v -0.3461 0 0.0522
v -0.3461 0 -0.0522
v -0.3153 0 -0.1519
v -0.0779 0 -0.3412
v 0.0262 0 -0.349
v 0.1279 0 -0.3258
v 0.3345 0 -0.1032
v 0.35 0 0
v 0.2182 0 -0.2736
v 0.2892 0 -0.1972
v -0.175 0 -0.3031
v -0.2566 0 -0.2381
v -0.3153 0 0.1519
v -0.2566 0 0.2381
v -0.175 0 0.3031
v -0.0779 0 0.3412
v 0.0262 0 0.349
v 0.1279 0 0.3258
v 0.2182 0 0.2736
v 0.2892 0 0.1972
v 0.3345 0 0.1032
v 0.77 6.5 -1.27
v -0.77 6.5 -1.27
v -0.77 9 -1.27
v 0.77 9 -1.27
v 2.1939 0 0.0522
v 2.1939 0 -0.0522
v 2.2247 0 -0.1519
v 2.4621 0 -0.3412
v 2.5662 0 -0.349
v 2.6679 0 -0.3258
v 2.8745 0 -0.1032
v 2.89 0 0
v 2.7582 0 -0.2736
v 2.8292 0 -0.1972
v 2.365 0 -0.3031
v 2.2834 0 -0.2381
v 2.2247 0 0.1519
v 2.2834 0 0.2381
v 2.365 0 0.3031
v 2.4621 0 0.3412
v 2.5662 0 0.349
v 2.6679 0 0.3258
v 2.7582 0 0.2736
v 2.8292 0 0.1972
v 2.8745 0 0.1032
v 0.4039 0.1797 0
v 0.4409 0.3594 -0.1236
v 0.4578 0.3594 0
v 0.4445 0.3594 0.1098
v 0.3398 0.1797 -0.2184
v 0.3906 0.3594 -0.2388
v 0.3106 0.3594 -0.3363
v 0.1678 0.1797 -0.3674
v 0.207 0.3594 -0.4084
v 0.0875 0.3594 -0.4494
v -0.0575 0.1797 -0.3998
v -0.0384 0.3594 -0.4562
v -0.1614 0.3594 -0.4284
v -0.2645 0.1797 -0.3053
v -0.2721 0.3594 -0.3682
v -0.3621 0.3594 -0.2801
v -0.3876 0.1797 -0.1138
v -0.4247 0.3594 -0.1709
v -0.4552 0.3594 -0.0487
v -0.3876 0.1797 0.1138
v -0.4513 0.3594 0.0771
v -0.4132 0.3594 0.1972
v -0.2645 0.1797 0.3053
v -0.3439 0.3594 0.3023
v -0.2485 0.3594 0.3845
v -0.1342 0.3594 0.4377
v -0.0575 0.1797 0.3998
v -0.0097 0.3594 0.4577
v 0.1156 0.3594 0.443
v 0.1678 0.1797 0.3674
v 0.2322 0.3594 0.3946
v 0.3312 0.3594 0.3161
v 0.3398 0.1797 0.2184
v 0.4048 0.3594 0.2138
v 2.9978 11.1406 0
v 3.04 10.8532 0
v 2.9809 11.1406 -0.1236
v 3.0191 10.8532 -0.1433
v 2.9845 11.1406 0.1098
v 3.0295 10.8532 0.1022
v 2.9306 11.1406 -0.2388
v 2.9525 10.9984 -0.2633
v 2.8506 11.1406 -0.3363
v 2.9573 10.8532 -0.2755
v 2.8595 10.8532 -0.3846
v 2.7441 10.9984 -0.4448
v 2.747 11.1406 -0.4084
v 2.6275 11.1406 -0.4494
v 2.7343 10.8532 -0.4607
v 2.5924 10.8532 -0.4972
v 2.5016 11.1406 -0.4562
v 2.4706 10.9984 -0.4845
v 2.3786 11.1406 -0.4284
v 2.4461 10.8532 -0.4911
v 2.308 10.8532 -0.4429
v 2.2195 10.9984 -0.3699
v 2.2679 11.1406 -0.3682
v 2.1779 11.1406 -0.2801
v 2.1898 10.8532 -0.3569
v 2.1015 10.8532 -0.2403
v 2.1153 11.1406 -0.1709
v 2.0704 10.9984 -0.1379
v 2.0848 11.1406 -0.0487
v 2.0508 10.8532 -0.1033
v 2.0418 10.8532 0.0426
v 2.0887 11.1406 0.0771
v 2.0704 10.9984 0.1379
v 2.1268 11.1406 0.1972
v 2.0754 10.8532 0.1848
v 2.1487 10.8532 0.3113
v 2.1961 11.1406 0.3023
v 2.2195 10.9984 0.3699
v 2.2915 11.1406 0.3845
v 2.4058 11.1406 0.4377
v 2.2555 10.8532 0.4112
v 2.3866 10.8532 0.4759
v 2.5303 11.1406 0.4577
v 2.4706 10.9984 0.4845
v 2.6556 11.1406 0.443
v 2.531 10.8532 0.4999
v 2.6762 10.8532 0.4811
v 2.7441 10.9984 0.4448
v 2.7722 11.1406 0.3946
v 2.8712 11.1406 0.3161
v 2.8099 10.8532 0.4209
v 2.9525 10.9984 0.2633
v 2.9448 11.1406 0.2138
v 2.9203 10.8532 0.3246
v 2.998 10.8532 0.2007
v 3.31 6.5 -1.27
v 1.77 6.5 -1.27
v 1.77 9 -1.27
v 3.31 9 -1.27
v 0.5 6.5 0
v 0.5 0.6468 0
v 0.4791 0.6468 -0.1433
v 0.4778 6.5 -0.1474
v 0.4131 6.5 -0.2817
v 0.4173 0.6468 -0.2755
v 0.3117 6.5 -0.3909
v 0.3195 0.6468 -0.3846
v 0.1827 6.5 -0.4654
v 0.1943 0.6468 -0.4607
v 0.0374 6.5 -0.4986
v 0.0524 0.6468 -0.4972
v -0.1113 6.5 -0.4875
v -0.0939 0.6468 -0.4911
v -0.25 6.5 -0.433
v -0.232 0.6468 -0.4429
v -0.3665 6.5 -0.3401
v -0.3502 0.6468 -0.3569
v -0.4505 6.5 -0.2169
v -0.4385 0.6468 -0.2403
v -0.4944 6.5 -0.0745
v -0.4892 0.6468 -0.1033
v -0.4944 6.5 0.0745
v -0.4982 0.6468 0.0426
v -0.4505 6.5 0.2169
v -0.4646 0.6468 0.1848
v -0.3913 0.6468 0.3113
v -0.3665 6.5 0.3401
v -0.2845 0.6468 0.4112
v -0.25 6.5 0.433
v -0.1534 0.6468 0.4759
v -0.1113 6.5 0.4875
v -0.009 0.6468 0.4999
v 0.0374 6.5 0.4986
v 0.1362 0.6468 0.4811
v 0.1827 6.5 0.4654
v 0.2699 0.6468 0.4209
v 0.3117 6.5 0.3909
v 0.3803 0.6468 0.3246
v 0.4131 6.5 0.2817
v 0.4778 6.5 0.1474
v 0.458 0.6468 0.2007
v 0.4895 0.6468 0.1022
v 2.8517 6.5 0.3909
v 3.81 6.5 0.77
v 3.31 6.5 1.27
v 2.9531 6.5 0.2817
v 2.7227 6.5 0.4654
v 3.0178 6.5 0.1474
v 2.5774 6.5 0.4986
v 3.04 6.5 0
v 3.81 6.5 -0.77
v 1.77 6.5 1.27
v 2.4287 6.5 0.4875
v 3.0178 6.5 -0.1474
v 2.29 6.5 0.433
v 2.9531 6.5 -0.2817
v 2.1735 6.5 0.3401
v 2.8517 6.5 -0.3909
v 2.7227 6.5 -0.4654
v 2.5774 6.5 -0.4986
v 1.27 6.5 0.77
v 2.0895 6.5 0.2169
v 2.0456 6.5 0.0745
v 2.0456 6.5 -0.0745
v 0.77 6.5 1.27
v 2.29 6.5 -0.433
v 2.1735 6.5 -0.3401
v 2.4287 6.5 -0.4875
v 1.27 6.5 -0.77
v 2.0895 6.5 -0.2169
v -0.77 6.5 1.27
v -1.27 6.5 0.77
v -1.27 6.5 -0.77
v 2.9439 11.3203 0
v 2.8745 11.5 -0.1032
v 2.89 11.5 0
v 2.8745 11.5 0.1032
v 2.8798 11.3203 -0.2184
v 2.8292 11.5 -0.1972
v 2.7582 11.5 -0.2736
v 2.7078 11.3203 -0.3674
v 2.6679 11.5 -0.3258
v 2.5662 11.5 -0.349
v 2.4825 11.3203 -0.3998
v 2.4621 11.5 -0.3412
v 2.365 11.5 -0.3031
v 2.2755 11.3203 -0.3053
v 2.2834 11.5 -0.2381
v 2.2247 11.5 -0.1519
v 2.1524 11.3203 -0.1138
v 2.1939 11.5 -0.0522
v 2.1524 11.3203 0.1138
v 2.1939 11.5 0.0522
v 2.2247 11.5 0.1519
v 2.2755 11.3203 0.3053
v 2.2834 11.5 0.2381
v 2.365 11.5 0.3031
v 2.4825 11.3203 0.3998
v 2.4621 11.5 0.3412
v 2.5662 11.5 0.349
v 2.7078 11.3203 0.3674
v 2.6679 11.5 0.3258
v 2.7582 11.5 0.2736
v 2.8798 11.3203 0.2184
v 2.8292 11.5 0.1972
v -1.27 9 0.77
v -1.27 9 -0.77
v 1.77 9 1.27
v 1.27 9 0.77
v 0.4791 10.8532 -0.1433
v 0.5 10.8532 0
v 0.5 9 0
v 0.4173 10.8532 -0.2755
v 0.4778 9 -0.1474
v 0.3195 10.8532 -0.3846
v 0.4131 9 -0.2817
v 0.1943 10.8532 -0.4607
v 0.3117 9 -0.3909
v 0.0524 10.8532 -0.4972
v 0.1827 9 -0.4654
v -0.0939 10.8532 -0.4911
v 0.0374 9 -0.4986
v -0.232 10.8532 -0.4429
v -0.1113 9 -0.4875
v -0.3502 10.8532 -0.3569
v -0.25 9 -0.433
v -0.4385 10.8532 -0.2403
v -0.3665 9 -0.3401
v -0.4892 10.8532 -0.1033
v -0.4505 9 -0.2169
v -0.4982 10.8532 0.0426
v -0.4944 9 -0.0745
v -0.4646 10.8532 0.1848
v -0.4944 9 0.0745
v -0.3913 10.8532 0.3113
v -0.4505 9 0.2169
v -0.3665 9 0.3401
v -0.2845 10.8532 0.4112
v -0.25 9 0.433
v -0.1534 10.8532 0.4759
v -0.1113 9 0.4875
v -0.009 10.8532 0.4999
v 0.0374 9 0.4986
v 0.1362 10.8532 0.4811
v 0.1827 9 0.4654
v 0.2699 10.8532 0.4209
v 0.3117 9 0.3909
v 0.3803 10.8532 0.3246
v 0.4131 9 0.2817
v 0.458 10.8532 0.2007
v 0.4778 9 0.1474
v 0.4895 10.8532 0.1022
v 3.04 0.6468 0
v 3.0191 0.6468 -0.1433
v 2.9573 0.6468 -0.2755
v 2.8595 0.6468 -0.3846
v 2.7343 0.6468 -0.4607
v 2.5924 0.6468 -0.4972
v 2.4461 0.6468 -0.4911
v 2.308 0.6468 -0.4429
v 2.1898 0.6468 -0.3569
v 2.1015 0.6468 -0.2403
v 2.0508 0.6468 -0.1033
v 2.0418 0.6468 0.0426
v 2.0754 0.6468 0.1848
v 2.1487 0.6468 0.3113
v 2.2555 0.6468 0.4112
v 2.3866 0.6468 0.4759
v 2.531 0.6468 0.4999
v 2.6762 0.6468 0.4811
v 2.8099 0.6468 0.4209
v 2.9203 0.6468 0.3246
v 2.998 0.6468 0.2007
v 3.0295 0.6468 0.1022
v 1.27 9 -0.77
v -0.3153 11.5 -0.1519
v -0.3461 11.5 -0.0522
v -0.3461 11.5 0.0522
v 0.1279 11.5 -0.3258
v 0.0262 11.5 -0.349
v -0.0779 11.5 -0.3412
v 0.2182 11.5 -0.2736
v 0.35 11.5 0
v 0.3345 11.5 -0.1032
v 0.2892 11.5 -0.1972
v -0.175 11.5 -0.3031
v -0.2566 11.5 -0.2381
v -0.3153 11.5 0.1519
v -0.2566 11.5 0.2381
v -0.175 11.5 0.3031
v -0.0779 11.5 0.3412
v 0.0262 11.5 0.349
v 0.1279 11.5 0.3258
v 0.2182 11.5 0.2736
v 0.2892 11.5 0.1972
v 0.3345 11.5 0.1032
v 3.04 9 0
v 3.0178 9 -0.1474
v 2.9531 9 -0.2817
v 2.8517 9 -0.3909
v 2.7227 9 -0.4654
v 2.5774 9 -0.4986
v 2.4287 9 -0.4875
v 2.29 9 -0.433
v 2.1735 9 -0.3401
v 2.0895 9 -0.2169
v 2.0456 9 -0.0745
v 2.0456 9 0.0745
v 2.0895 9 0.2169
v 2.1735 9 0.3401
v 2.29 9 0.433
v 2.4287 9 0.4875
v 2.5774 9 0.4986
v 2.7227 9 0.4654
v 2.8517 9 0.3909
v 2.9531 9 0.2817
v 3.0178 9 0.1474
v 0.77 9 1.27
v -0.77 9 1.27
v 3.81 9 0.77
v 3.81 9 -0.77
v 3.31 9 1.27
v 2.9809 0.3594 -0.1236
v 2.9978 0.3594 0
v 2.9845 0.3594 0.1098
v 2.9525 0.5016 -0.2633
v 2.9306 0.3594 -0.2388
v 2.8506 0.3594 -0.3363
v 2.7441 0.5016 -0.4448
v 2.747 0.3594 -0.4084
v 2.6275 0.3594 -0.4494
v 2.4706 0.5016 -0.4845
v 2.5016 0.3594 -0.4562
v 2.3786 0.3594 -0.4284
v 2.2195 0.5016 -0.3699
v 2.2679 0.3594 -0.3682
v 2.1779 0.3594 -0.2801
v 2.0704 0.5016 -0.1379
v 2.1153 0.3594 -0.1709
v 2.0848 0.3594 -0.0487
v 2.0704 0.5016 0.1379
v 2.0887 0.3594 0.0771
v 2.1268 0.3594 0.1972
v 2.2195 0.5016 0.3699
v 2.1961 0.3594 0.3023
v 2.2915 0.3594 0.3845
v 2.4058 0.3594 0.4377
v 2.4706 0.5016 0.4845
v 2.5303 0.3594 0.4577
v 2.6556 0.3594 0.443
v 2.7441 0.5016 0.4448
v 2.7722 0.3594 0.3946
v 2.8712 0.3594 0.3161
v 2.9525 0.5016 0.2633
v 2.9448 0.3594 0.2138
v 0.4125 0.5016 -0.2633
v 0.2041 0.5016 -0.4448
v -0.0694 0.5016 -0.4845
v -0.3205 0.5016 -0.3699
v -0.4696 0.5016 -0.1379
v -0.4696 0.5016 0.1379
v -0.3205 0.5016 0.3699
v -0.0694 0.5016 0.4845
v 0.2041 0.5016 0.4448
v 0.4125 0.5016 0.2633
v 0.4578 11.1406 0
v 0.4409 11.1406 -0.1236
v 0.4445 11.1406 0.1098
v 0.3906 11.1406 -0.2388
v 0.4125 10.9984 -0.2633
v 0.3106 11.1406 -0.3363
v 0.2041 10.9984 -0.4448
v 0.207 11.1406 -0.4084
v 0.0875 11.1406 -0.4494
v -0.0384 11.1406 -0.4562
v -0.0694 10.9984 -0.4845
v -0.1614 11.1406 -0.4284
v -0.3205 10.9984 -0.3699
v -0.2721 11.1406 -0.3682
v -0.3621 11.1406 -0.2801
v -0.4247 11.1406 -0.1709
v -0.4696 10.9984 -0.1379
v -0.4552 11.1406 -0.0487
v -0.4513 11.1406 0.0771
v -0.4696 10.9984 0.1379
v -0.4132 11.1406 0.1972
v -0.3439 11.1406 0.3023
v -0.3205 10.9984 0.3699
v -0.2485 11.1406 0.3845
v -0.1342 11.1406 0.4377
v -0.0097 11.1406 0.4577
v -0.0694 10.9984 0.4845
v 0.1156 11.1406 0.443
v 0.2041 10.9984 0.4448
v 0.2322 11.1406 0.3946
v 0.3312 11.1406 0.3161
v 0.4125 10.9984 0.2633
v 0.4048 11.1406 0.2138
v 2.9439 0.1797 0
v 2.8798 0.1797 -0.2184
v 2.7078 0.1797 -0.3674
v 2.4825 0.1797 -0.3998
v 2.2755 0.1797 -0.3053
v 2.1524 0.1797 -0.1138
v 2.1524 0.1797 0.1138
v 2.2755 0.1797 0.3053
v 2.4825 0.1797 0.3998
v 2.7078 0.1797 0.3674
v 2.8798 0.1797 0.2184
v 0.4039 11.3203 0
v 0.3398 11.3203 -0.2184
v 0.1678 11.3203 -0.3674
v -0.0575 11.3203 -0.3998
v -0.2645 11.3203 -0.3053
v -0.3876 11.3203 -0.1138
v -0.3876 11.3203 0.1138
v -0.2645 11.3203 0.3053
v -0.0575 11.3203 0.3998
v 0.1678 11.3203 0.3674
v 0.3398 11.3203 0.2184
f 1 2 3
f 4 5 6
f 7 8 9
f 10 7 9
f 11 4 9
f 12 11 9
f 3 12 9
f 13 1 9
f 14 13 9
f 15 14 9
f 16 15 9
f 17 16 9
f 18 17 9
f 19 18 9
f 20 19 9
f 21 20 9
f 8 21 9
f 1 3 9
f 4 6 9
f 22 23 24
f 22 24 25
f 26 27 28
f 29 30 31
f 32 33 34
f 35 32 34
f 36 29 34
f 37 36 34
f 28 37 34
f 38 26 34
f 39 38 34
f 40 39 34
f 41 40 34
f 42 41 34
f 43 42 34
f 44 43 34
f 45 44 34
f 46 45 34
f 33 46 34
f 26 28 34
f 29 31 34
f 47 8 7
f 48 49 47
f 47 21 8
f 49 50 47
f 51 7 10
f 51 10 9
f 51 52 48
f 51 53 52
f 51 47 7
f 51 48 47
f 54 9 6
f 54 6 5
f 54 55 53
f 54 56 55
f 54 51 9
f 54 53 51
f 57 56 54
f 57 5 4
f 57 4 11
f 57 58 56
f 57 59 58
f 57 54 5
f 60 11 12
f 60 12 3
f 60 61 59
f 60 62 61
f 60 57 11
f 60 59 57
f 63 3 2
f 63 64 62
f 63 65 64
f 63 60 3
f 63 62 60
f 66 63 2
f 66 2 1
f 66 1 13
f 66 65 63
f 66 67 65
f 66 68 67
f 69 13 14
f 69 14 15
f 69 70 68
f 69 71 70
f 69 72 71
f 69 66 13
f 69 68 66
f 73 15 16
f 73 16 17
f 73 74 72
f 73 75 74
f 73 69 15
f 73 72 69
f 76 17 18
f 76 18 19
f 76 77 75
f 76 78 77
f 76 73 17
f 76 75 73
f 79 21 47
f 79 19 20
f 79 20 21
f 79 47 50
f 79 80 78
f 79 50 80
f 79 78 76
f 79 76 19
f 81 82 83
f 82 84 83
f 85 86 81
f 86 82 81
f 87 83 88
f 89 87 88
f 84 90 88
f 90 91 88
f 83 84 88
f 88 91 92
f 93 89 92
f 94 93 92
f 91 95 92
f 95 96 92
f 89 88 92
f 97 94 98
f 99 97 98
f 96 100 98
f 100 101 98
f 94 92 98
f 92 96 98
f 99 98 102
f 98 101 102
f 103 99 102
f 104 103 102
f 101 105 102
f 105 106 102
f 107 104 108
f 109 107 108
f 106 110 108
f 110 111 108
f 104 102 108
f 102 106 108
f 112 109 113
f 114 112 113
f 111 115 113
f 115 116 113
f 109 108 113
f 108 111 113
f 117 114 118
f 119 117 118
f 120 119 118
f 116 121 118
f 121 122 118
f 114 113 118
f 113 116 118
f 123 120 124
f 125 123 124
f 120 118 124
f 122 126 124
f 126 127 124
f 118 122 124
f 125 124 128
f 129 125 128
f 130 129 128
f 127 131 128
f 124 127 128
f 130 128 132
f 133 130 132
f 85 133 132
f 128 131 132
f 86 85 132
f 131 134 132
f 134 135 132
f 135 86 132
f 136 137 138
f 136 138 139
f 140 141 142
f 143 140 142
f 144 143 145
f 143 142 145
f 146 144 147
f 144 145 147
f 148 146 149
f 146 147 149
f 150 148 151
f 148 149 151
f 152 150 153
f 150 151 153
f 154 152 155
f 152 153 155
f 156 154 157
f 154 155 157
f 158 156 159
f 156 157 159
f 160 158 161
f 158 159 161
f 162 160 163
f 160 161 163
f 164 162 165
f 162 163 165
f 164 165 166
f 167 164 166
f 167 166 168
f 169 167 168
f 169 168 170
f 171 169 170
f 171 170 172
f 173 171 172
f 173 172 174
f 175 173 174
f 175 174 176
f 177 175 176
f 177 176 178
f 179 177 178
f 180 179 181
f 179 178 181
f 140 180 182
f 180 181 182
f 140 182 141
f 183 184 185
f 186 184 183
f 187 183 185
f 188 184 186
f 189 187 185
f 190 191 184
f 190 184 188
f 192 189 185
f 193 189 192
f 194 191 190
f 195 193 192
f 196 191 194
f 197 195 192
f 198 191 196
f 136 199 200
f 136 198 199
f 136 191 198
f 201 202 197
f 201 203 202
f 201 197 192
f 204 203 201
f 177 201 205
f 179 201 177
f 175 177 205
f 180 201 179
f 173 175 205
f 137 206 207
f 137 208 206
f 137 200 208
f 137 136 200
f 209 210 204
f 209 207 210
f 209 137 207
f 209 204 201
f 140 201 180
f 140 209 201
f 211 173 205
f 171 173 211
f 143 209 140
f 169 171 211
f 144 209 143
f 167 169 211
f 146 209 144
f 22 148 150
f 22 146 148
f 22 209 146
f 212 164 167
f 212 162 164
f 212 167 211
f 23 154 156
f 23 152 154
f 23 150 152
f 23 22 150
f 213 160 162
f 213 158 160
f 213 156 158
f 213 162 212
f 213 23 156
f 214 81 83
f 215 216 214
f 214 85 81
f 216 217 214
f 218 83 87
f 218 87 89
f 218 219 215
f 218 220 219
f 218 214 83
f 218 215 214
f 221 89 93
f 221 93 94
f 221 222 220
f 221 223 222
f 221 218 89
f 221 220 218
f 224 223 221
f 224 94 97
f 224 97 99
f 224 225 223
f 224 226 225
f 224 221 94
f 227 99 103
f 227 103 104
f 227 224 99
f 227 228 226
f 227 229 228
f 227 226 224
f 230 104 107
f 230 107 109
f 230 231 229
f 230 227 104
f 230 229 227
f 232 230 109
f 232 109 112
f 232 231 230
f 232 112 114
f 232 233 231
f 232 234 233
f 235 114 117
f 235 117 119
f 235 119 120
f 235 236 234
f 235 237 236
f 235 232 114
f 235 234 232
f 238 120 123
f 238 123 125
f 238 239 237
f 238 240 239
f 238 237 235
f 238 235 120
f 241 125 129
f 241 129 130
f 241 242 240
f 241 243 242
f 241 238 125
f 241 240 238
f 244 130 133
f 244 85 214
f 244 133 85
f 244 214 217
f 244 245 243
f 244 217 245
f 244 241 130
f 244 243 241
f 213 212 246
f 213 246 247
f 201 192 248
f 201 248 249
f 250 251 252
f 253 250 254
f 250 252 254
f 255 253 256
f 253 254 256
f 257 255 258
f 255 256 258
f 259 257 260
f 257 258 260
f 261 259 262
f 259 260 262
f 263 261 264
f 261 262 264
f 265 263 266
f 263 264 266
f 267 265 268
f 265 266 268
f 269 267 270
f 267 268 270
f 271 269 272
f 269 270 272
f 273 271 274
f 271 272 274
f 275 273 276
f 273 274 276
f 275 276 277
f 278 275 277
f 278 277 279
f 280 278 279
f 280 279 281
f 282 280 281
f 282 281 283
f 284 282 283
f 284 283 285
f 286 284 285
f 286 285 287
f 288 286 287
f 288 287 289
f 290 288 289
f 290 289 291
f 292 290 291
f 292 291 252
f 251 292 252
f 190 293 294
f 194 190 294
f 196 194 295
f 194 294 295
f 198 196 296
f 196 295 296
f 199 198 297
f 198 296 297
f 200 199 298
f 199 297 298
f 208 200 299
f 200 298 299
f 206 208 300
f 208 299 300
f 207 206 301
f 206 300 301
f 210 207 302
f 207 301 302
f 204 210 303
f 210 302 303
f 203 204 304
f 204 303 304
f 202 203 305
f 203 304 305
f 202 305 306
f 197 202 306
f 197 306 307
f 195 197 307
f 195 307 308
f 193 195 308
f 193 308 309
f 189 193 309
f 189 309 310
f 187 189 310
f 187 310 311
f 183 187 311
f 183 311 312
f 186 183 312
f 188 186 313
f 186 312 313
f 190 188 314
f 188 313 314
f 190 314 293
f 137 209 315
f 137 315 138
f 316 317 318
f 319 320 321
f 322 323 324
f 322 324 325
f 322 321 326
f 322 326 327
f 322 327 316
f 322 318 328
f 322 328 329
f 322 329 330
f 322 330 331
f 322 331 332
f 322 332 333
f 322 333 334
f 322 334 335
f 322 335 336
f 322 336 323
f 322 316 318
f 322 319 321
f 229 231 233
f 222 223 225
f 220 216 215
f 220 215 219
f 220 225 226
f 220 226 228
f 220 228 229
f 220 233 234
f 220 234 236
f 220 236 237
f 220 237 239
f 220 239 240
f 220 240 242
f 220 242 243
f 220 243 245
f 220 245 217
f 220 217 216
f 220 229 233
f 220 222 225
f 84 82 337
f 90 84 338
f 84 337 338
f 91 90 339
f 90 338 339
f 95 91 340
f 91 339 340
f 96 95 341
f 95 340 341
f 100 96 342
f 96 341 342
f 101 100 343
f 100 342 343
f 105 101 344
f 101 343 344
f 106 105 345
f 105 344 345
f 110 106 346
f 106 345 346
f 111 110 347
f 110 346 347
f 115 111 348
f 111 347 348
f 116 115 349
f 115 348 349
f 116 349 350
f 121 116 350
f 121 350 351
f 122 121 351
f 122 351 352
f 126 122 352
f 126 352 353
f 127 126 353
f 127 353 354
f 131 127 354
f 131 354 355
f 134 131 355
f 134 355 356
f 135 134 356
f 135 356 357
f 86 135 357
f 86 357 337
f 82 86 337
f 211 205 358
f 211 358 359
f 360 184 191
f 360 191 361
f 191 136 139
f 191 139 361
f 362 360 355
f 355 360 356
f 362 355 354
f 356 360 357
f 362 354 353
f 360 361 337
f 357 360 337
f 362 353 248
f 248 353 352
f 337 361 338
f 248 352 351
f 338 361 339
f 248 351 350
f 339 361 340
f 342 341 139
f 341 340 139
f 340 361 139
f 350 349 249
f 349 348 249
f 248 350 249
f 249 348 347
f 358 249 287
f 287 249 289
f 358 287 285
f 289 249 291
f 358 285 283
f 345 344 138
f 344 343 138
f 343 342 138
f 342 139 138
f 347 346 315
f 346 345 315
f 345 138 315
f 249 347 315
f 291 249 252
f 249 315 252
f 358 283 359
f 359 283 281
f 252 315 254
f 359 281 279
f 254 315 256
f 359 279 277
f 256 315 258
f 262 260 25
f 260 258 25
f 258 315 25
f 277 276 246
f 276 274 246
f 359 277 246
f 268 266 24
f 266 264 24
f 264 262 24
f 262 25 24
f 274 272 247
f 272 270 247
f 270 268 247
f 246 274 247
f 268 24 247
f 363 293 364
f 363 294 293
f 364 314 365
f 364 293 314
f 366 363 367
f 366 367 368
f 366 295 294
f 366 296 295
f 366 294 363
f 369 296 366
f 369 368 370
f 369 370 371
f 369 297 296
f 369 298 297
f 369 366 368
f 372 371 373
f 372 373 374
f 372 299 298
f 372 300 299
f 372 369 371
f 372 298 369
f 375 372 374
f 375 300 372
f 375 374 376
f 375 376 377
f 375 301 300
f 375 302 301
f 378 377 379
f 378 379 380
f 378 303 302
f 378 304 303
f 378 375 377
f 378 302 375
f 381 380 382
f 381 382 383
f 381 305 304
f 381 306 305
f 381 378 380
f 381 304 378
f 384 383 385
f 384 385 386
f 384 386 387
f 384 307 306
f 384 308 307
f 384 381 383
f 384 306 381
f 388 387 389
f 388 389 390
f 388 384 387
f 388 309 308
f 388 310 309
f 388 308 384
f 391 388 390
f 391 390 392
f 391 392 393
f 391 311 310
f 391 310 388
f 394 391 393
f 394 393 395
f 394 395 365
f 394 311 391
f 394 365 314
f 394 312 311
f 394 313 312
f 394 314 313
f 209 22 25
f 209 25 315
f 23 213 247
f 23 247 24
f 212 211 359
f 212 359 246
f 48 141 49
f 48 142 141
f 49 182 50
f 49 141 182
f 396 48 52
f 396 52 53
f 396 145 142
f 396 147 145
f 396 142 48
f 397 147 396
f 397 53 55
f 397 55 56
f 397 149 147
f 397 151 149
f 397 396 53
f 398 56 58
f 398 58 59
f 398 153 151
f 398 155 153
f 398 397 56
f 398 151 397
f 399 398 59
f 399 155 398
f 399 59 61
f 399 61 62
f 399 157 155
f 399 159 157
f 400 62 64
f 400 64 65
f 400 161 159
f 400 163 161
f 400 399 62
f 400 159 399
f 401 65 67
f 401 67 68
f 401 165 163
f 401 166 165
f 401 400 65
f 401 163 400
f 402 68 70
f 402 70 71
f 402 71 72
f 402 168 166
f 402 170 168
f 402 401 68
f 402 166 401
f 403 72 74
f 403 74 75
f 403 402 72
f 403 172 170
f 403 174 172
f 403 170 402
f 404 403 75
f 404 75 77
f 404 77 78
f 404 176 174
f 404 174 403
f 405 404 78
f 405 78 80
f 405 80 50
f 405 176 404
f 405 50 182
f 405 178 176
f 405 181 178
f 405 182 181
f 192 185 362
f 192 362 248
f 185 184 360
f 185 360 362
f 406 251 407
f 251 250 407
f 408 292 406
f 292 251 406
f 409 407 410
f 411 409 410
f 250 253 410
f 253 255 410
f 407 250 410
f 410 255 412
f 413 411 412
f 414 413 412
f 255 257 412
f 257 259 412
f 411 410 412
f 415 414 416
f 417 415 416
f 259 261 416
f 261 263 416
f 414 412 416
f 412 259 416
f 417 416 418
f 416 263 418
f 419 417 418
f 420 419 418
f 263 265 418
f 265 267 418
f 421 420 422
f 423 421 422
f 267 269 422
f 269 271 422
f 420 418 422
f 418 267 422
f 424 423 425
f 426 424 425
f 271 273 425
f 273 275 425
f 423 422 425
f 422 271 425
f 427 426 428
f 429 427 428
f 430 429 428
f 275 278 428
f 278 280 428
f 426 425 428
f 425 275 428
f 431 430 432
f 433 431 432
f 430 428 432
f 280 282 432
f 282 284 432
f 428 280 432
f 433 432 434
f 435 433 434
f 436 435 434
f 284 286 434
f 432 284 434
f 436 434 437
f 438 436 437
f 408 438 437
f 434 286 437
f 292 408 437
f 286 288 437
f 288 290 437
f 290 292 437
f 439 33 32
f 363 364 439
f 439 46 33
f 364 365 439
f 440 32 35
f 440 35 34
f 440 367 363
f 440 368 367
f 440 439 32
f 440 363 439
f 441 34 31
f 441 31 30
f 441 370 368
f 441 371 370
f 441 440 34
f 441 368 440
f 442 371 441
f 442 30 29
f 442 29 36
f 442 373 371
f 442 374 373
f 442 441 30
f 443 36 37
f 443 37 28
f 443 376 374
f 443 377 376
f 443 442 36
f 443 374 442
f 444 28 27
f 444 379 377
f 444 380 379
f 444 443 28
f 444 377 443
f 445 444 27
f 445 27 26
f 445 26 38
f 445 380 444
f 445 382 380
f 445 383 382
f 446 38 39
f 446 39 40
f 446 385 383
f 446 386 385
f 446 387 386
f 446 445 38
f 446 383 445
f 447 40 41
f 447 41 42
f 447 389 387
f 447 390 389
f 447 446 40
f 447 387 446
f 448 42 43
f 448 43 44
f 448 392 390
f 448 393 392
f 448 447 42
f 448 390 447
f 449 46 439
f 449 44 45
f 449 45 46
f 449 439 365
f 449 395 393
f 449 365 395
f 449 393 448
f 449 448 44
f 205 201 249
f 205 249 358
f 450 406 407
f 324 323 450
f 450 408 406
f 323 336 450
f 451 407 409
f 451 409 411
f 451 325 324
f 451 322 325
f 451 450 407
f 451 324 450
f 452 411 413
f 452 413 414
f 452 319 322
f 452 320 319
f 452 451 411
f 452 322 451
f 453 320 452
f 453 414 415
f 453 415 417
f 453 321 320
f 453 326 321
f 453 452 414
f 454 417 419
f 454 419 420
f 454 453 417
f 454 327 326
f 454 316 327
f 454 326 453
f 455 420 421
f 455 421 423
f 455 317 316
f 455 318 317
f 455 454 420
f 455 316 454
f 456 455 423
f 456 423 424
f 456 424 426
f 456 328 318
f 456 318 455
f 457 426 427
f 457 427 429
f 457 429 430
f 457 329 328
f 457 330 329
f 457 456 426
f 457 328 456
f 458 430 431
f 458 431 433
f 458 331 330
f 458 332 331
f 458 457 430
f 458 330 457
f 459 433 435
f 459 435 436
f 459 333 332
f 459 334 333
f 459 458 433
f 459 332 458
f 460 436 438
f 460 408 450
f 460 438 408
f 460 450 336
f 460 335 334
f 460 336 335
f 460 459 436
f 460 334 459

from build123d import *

# Parameters (mm, degrees)
SKETCH1_R               = 0.5
BOSS_EXTRUDE1_DEPTH     = 11.5
BOSS_EXTRUDE1_2_DEPTH   = 11.5
BOSS_EXTRUDE1_3_DEPTH   = 11.5
BOSS_EXTRUDE1_4_DEPTH   = 11.5
BOSS_EXTRUDE1_5_DEPTH   = 11.5
BOSS_EXTRUDE1_6_DEPTH   = 11.5
BOSS_EXTRUDE1_7_DEPTH   = 11.5
BOSS_EXTRUDE1_8_DEPTH   = 11.5
BOSS_EXTRUDE1_9_DEPTH   = 11.5
BOSS_EXTRUDE1_10_DEPTH  = 11.5
BOSS_EXTRUDE1_11_DEPTH  = 11.5
BOSS_EXTRUDE1_12_DEPTH  = 11.5
BOSS_EXTRUDE1_13_DEPTH  = 11.5
BOSS_EXTRUDE1_14_DEPTH  = 11.5
BOSS_EXTRUDE1_15_DEPTH  = 11.5
BOSS_EXTRUDE1_16_DEPTH  = 11.5
BOSS_EXTRUDE2_DEPTH     = 2.5
CHAMFER1_SIZE           = 0.5
CHAMFER1_SIZE2          = 0.15
CHAMFER1_PART_2_SIZE    = 0.5
CHAMFER1_PART_2_SIZE2   = 0.15
CHAMFER1_PART_3_SIZE    = 0.5
CHAMFER1_PART_3_SIZE2   = 0.15
CHAMFER1_PART_4_SIZE    = 0.5
CHAMFER1_PART_4_SIZE2   = 0.15
CHAMFER1_PART_5_SIZE    = 0.5
CHAMFER1_PART_5_SIZE2   = 0.15
CHAMFER1_PART_6_SIZE    = 0.5
CHAMFER1_PART_6_SIZE2   = 0.15
CHAMFER1_PART_7_SIZE    = 0.5
CHAMFER1_PART_7_SIZE2   = 0.15
CHAMFER1_PART_8_SIZE    = 0.5
CHAMFER1_PART_8_SIZE2   = 0.15
CHAMFER1_PART_9_SIZE    = 0.5
CHAMFER1_PART_9_SIZE2   = 0.15
CHAMFER1_PART_10_SIZE   = 0.5
CHAMFER1_PART_10_SIZE2  = 0.15
CHAMFER1_PART_11_SIZE   = 0.5
CHAMFER1_PART_11_SIZE2  = 0.15
CHAMFER1_PART_12_SIZE   = 0.5
CHAMFER1_PART_12_SIZE2  = 0.15
CHAMFER1_PART_13_SIZE   = 0.5
CHAMFER1_PART_13_SIZE2  = 0.15
CHAMFER1_PART_14_SIZE   = 0.5
CHAMFER1_PART_14_SIZE2  = 0.15
CHAMFER1_PART_15_SIZE   = 0.5
CHAMFER1_PART_15_SIZE2  = 0.15
CHAMFER1_PART_16_SIZE   = 0.5
CHAMFER1_PART_16_SIZE2  = 0.15
FILLET1_R               = 1
CHAMFER2_SIZE           = 0.15
CHAMFER2_SIZE2          = 0.5
CHAMFER2_PART_2_SIZE    = 0.15
CHAMFER2_PART_2_SIZE2   = 0.5
CHAMFER2_PART_3_SIZE    = 0.15
CHAMFER2_PART_3_SIZE2   = 0.5
CHAMFER2_PART_4_SIZE    = 0.15
CHAMFER2_PART_4_SIZE2   = 0.5
CHAMFER2_PART_5_SIZE    = 0.15
CHAMFER2_PART_5_SIZE2   = 0.5
CHAMFER2_PART_6_SIZE    = 0.15
CHAMFER2_PART_6_SIZE2   = 0.5
CHAMFER2_PART_7_SIZE    = 0.15
CHAMFER2_PART_7_SIZE2   = 0.5
CHAMFER2_PART_8_SIZE    = 0.15
CHAMFER2_PART_8_SIZE2   = 0.5
CHAMFER2_PART_9_SIZE    = 0.15
CHAMFER2_PART_9_SIZE2   = 0.5
CHAMFER2_PART_10_SIZE   = 0.15
CHAMFER2_PART_10_SIZE2  = 0.5
CHAMFER2_PART_11_SIZE   = 0.15
CHAMFER2_PART_11_SIZE2  = 0.5
CHAMFER2_PART_12_SIZE   = 0.15
CHAMFER2_PART_12_SIZE2  = 0.5
CHAMFER2_PART_13_SIZE   = 0.15
CHAMFER2_PART_13_SIZE2  = 0.5
CHAMFER2_PART_14_SIZE   = 0.15
CHAMFER2_PART_14_SIZE2  = 0.5
CHAMFER2_PART_15_SIZE   = 0.15
CHAMFER2_PART_15_SIZE2  = 0.5
CHAMFER2_PART_16_SIZE   = 0.15
CHAMFER2_PART_16_SIZE2  = 0.5
FILLET2_R               = 1
CUT_EXTRUDE1_DEPTH      = 3.54
CUT_EXTRUDE2_DEPTH      = 3.54
SKETCH5_W               = 12.7
SKETCH5_H               = 11.5
CUT_EXTRUDE3_DEPTH      = 1
CUT_EXTRUDE3_DEPTH_BACK = 3.54


with BuildPart() as part:
    # Sketch1 → Boss-Extrude1 (new body)
    with BuildSketch(Plane(origin=(0, 0, 0), x_dir=(1, 0, 0), z_dir=(0, 1, 0))):
        Circle(SKETCH1_R)
    extrude(amount=BOSS_EXTRUDE1_DEPTH)



with BuildPart() as body_2:
    # Sketch1 → Boss-Extrude1 2 (new body)
    with BuildSketch(Plane(origin=(0, 0, 0), x_dir=(1, 0, 0), z_dir=(0, 1, 0))):
        with Locations((2.54, 0)):
            Circle(SKETCH1_R)
    extrude(amount=BOSS_EXTRUDE1_2_DEPTH)


with BuildPart() as body_3:
    # Sketch1 → Boss-Extrude1 3 (new body)
    with BuildSketch(Plane(origin=(0, 0, 0), x_dir=(1, 0, 0), z_dir=(0, 1, 0))):
        with Locations((5.08, 0)):
            Circle(SKETCH1_R)
    extrude(amount=BOSS_EXTRUDE1_3_DEPTH)


with BuildPart() as body_4:
    # Sketch1 → Boss-Extrude1 4 (new body)
    with BuildSketch(Plane(origin=(0, 0, 0), x_dir=(1, 0, 0), z_dir=(0, 1, 0))):
        with Locations((7.62, 0)):
            Circle(SKETCH1_R)
    extrude(amount=BOSS_EXTRUDE1_4_DEPTH)


with BuildPart() as body_5:
    # Sketch1 → Boss-Extrude1 5 (new body)
    with BuildSketch(Plane(origin=(0, 0, 0), x_dir=(1, 0, 0), z_dir=(0, 1, 0))):
        with Locations((10.16, 0)):
            Circle(SKETCH1_R)
    extrude(amount=BOSS_EXTRUDE1_5_DEPTH)


with BuildPart() as body_6:
    # Sketch1 → Boss-Extrude1 6 (new body)
    with BuildSketch(Plane(origin=(0, 0, 0), x_dir=(1, 0, 0), z_dir=(0, 1, 0))):
        with Locations((12.7, 0)):
            Circle(SKETCH1_R)
    extrude(amount=BOSS_EXTRUDE1_6_DEPTH)


with BuildPart() as body_7:
    # Sketch1 → Boss-Extrude1 7 (new body)
    with BuildSketch(Plane(origin=(0, 0, 0), x_dir=(1, 0, 0), z_dir=(0, 1, 0))):
        with Locations((15.24, 0)):
            Circle(SKETCH1_R)
    extrude(amount=BOSS_EXTRUDE1_7_DEPTH)


with BuildPart() as body_8:
    # Sketch1 → Boss-Extrude1 8 (new body)
    with BuildSketch(Plane(origin=(0, 0, 0), x_dir=(1, 0, 0), z_dir=(0, 1, 0))):
        with Locations((17.78, 0)):
            Circle(SKETCH1_R)
    extrude(amount=BOSS_EXTRUDE1_8_DEPTH)


with BuildPart() as body_9:
    # Sketch1 → Boss-Extrude1 9 (new body)
    with BuildSketch(Plane(origin=(0, 0, 0), x_dir=(1, 0, 0), z_dir=(0, 1, 0))):
        with Locations((20.32, 0)):
            Circle(SKETCH1_R)
    extrude(amount=BOSS_EXTRUDE1_9_DEPTH)


with BuildPart() as body_10:
    # Sketch1 → Boss-Extrude1 10 (new body)
    with BuildSketch(Plane(origin=(0, 0, 0), x_dir=(1, 0, 0), z_dir=(0, 1, 0))):
        with Locations((22.86, 0)):
            Circle(SKETCH1_R)
    extrude(amount=BOSS_EXTRUDE1_10_DEPTH)


with BuildPart() as body_11:
    # Sketch1 → Boss-Extrude1 11 (new body)
    with BuildSketch(Plane(origin=(0, 0, 0), x_dir=(1, 0, 0), z_dir=(0, 1, 0))):
        with Locations((25.4, 0)):
            Circle(SKETCH1_R)
    extrude(amount=BOSS_EXTRUDE1_11_DEPTH)


with BuildPart() as body_12:
    # Sketch1 → Boss-Extrude1 12 (new body)
    with BuildSketch(Plane(origin=(0, 0, 0), x_dir=(1, 0, 0), z_dir=(0, 1, 0))):
        with Locations((27.94, 0)):
            Circle(SKETCH1_R)
    extrude(amount=BOSS_EXTRUDE1_12_DEPTH)


with BuildPart() as body_13:
    # Sketch1 → Boss-Extrude1 13 (new body)
    with BuildSketch(Plane(origin=(0, 0, 0), x_dir=(1, 0, 0), z_dir=(0, 1, 0))):
        with Locations((30.48, 0)):
            Circle(SKETCH1_R)
    extrude(amount=BOSS_EXTRUDE1_13_DEPTH)


with BuildPart() as body_14:
    # Sketch1 → Boss-Extrude1 14 (new body)
    with BuildSketch(Plane(origin=(0, 0, 0), x_dir=(1, 0, 0), z_dir=(0, 1, 0))):
        with Locations((33.02, 0)):
            Circle(SKETCH1_R)
    extrude(amount=BOSS_EXTRUDE1_14_DEPTH)


with BuildPart() as body_15:
    # Sketch1 → Boss-Extrude1 15 (new body)
    with BuildSketch(Plane(origin=(0, 0, 0), x_dir=(1, 0, 0), z_dir=(0, 1, 0))):
        with Locations((35.56, 0)):
            Circle(SKETCH1_R)
    extrude(amount=BOSS_EXTRUDE1_15_DEPTH)


with BuildPart() as body_16:
    # Sketch1 → Boss-Extrude1 16 (new body)
    with BuildSketch(Plane(origin=(0, 0, 0), x_dir=(1, 0, 0), z_dir=(0, 1, 0))):
        with Locations((38.1, 0)):
            Circle(SKETCH1_R)
    extrude(amount=BOSS_EXTRUDE1_16_DEPTH)


with BuildPart() as part_1:
    add(part.part)

    add(body_2.part)  # Boss-Extrude2 merges body 2

    add(body_3.part)  # Boss-Extrude2 merges body 3

    add(body_4.part)  # Boss-Extrude2 merges body 4

    add(body_5.part)  # Boss-Extrude2 merges body 5

    add(body_6.part)  # Boss-Extrude2 merges body 6

    add(body_7.part)  # Boss-Extrude2 merges body 7

    add(body_8.part)  # Boss-Extrude2 merges body 8

    add(body_9.part)  # Boss-Extrude2 merges body 9

    add(body_10.part)  # Boss-Extrude2 merges body 10

    add(body_11.part)  # Boss-Extrude2 merges body 11

    add(body_12.part)  # Boss-Extrude2 merges body 12

    add(body_13.part)  # Boss-Extrude2 merges body 13

    add(body_14.part)  # Boss-Extrude2 merges body 14

    add(body_15.part)  # Boss-Extrude2 merges body 15

    add(body_16.part)  # Boss-Extrude2 merges body 16
    # Sketch2 → Boss-Extrude2 (add)
    with BuildSketch(Plane(origin=(0, 6.5, 0), x_dir=(1, 0, 0), z_dir=(0, 1, 0))):
        Polygon((-1.27, 0.77), (-0.77, 1.27), (0.77, 1.27), (1.27, 0.77), (1.77, 1.27), (3.31, 1.27), (3.81, 0.77), (4.31, 1.27), (5.85, 1.27), (6.35, 0.77), (6.85, 1.27), (8.39, 1.27), (8.89, 0.77), (9.39, 1.27), (10.93, 1.27), (11.43, 0.77), (11.93, 1.27), (13.47, 1.27), (13.97, 0.77), (14.47, 1.27), (16.01, 1.27), (16.51, 0.77), (17.01, 1.27), (18.55, 1.27), (19.05, 0.77), (19.55, 1.27), (21.09, 1.27), (21.59, 0.77), (22.09, 1.27), (23.63, 1.27), (24.13, 0.77), (24.63, 1.27), (26.17, 1.27), (26.67, 0.77), (27.17, 1.27), (28.71, 1.27), (29.21, 0.77), (29.71, 1.27), (31.25, 1.27), (31.75, 0.77), (32.25, 1.27), (33.79, 1.27), (34.29, 0.77), (34.79, 1.27), (36.33, 1.27), (36.83, 0.77), (37.33, 1.27), (38.87, 1.27), (39.37, 0.77), (39.37, -0.77), (38.87, -1.27), (37.33, -1.27), (36.83, -0.77), (36.33, -1.27), (34.79, -1.27), (34.29, -0.77), (33.79, -1.27), (32.25, -1.27), (31.75, -0.77), (31.25, -1.27), (29.71, -1.27), (29.21, -0.77), (28.71, -1.27), (27.17, -1.27), (26.67, -0.77), (26.17, -1.27), (24.63, -1.27), (24.13, -0.77), (23.63, -1.27), (22.09, -1.27), (21.59, -0.77), (21.09, -1.27), (19.55, -1.27), (19.05, -0.77), (18.55, -1.27), (17.01, -1.27), (16.51, -0.77), (16.01, -1.27), (14.47, -1.27), (13.97, -0.77), (13.47, -1.27), (11.93, -1.27), (11.43, -0.77), (10.93, -1.27), (9.39, -1.27), (8.89, -0.77), (8.39, -1.27), (6.85, -1.27), (6.35, -0.77), (5.85, -1.27), (4.31, -1.27), (3.81, -0.77), (3.31, -1.27), (1.77, -1.27), (1.27, -0.77), (0.77, -1.27), (-0.77, -1.27), (-1.27, -0.77), align=None)
    extrude(amount=BOSS_EXTRUDE2_DEPTH)

    # Chamfer1
    chamfer1_edges = [part_1.edges().sort_by_distance(p)[0] for p in [
        (2.04, 11.5, 0),
    ]]
    chamfer1_side = [part_1.faces().sort_by_distance(p)[0] for p in [
        (2.04, 10.25, 0),
    ]]
    chamfer(chamfer1_edges, length=CHAMFER1_SIZE, length2=CHAMFER1_SIZE2, reference=chamfer1_side[0])

    # Chamfer1 part 2
    chamfer1_part_2_edges = [part_1.edges().sort_by_distance(p)[0] for p in [
        (4.58, 11.5, 0),
    ]]
    chamfer1_part_2_side = [part_1.faces().sort_by_distance(p)[0] for p in [
        (4.58, 10.25, 0),
    ]]
    chamfer(chamfer1_part_2_edges, length=CHAMFER1_PART_2_SIZE, length2=CHAMFER1_PART_2_SIZE2, reference=chamfer1_part_2_side[0])

    # Chamfer1 part 3
    chamfer1_part_3_edges = [part_1.edges().sort_by_distance(p)[0] for p in [
        (7.12, 11.5, 0),
    ]]
    chamfer1_part_3_side = [part_1.faces().sort_by_distance(p)[0] for p in [
        (7.12, 10.25, 0),
    ]]
    chamfer(chamfer1_part_3_edges, length=CHAMFER1_PART_3_SIZE, length2=CHAMFER1_PART_3_SIZE2, reference=chamfer1_part_3_side[0])

    # Chamfer1 part 4
    chamfer1_part_4_edges = [part_1.edges().sort_by_distance(p)[0] for p in [
        (9.66, 11.5, 0),
    ]]
    chamfer1_part_4_side = [part_1.faces().sort_by_distance(p)[0] for p in [
        (9.66, 10.25, 0),
    ]]
    chamfer(chamfer1_part_4_edges, length=CHAMFER1_PART_4_SIZE, length2=CHAMFER1_PART_4_SIZE2, reference=chamfer1_part_4_side[0])

    # Chamfer1 part 5
    chamfer1_part_5_edges = [part_1.edges().sort_by_distance(p)[0] for p in [
        (12.2, 11.5, 0),
    ]]
    chamfer1_part_5_side = [part_1.faces().sort_by_distance(p)[0] for p in [
        (12.2, 10.25, 0),
    ]]
    chamfer(chamfer1_part_5_edges, length=CHAMFER1_PART_5_SIZE, length2=CHAMFER1_PART_5_SIZE2, reference=chamfer1_part_5_side[0])

    # Chamfer1 part 6
    chamfer1_part_6_edges = [part_1.edges().sort_by_distance(p)[0] for p in [
        (14.74, 11.5, 0),
    ]]
    chamfer1_part_6_side = [part_1.faces().sort_by_distance(p)[0] for p in [
        (14.74, 10.25, 0),
    ]]
    chamfer(chamfer1_part_6_edges, length=CHAMFER1_PART_6_SIZE, length2=CHAMFER1_PART_6_SIZE2, reference=chamfer1_part_6_side[0])

    # Chamfer1 part 7
    chamfer1_part_7_edges = [part_1.edges().sort_by_distance(p)[0] for p in [
        (17.28, 11.5, 0),
    ]]
    chamfer1_part_7_side = [part_1.faces().sort_by_distance(p)[0] for p in [
        (17.28, 10.25, 0),
    ]]
    chamfer(chamfer1_part_7_edges, length=CHAMFER1_PART_7_SIZE, length2=CHAMFER1_PART_7_SIZE2, reference=chamfer1_part_7_side[0])

    # Chamfer1 part 8
    chamfer1_part_8_edges = [part_1.edges().sort_by_distance(p)[0] for p in [
        (19.82, 11.5, 0),
    ]]
    chamfer1_part_8_side = [part_1.faces().sort_by_distance(p)[0] for p in [
        (19.82, 10.25, 0),
    ]]
    chamfer(chamfer1_part_8_edges, length=CHAMFER1_PART_8_SIZE, length2=CHAMFER1_PART_8_SIZE2, reference=chamfer1_part_8_side[0])

    # Chamfer1 part 9
    chamfer1_part_9_edges = [part_1.edges().sort_by_distance(p)[0] for p in [
        (22.36, 11.5, 0),
    ]]
    chamfer1_part_9_side = [part_1.faces().sort_by_distance(p)[0] for p in [
        (22.36, 10.25, 0),
    ]]
    chamfer(chamfer1_part_9_edges, length=CHAMFER1_PART_9_SIZE, length2=CHAMFER1_PART_9_SIZE2, reference=chamfer1_part_9_side[0])

    # Chamfer1 part 10
    chamfer1_part_10_edges = [part_1.edges().sort_by_distance(p)[0] for p in [
        (24.9, 11.5, 0),
    ]]
    chamfer1_part_10_side = [part_1.faces().sort_by_distance(p)[0] for p in [
        (24.9, 10.25, 0),
    ]]
    chamfer(chamfer1_part_10_edges, length=CHAMFER1_PART_10_SIZE, length2=CHAMFER1_PART_10_SIZE2, reference=chamfer1_part_10_side[0])

    # Chamfer1 part 11
    chamfer1_part_11_edges = [part_1.edges().sort_by_distance(p)[0] for p in [
        (27.44, 11.5, 0),
    ]]
    chamfer1_part_11_side = [part_1.faces().sort_by_distance(p)[0] for p in [
        (27.44, 10.25, 0),
    ]]
    chamfer(chamfer1_part_11_edges, length=CHAMFER1_PART_11_SIZE, length2=CHAMFER1_PART_11_SIZE2, reference=chamfer1_part_11_side[0])

    # Chamfer1 part 12
    chamfer1_part_12_edges = [part_1.edges().sort_by_distance(p)[0] for p in [
        (29.98, 11.5, 0),
    ]]
    chamfer1_part_12_side = [part_1.faces().sort_by_distance(p)[0] for p in [
        (29.98, 10.25, 0),
    ]]
    chamfer(chamfer1_part_12_edges, length=CHAMFER1_PART_12_SIZE, length2=CHAMFER1_PART_12_SIZE2, reference=chamfer1_part_12_side[0])

    # Chamfer1 part 13
    chamfer1_part_13_edges = [part_1.edges().sort_by_distance(p)[0] for p in [
        (32.52, 11.5, 0),
    ]]
    chamfer1_part_13_side = [part_1.faces().sort_by_distance(p)[0] for p in [
        (32.52, 10.25, 0),
    ]]
    chamfer(chamfer1_part_13_edges, length=CHAMFER1_PART_13_SIZE, length2=CHAMFER1_PART_13_SIZE2, reference=chamfer1_part_13_side[0])

    # Chamfer1 part 14
    chamfer1_part_14_edges = [part_1.edges().sort_by_distance(p)[0] for p in [
        (35.06, 11.5, 0),
    ]]
    chamfer1_part_14_side = [part_1.faces().sort_by_distance(p)[0] for p in [
        (35.06, 10.25, 0),
    ]]
    chamfer(chamfer1_part_14_edges, length=CHAMFER1_PART_14_SIZE, length2=CHAMFER1_PART_14_SIZE2, reference=chamfer1_part_14_side[0])

    # Chamfer1 part 15
    chamfer1_part_15_edges = [part_1.edges().sort_by_distance(p)[0] for p in [
        (37.6, 11.5, 0),
    ]]
    chamfer1_part_15_side = [part_1.faces().sort_by_distance(p)[0] for p in [
        (37.6, 10.25, 0),
    ]]
    chamfer(chamfer1_part_15_edges, length=CHAMFER1_PART_15_SIZE, length2=CHAMFER1_PART_15_SIZE2, reference=chamfer1_part_15_side[0])

    # Chamfer1 part 16
    chamfer1_part_16_edges = [part_1.edges().sort_by_distance(p)[0] for p in [
        (-0.5, 11.5, 0),
    ]]
    chamfer1_part_16_side = [part_1.faces().sort_by_distance(p)[0] for p in [
        (-0.5, 10.25, 0),
    ]]
    chamfer(chamfer1_part_16_edges, length=CHAMFER1_PART_16_SIZE, length2=CHAMFER1_PART_16_SIZE2, reference=chamfer1_part_16_side[0])

    # Fillet1
    fillet1_edges = [part_1.edges().sort_by_distance(p)[0] for p in [
        (37.6, 11, 0),
        (35.06, 11, 0),
        (32.52, 11, 0),
        (29.98, 11, 0),
        (27.44, 11, 0),
        (24.9, 11, 0),
        (22.36, 11, 0),
        (19.82, 11, 0),
        (17.28, 11, 0),
        (14.74, 11, 0),
        (12.2, 11, 0),
        (9.66, 11, 0),
        (7.12, 11, 0),
        (4.58, 11, 0),
        (2.04, 11, 0),
        (-0.5, 11, 0),
    ]]
    fillet(fillet1_edges, radius=FILLET1_R)

    # Chamfer2
    chamfer2_edges = [part_1.edges().sort_by_distance(p)[0] for p in [
        (-0.5, 0, 0),
    ]]
    chamfer2_side = [part_1.faces().sort_by_distance(p)[0] for p in [
        (0, 0, 0),
    ]]
    chamfer(chamfer2_edges, length=CHAMFER2_SIZE, length2=CHAMFER2_SIZE2, reference=chamfer2_side[0])

    # Chamfer2 part 2
    chamfer2_part_2_edges = [part_1.edges().sort_by_distance(p)[0] for p in [
        (2.04, 0, 0),
    ]]
    chamfer2_part_2_side = [part_1.faces().sort_by_distance(p)[0] for p in [
        (2.54, 0, 0),
    ]]
    chamfer(chamfer2_part_2_edges, length=CHAMFER2_PART_2_SIZE, length2=CHAMFER2_PART_2_SIZE2, reference=chamfer2_part_2_side[0])

    # Chamfer2 part 3
    chamfer2_part_3_edges = [part_1.edges().sort_by_distance(p)[0] for p in [
        (4.58, 0, 0),
    ]]
    chamfer2_part_3_side = [part_1.faces().sort_by_distance(p)[0] for p in [
        (5.08, 0, 0),
    ]]
    chamfer(chamfer2_part_3_edges, length=CHAMFER2_PART_3_SIZE, length2=CHAMFER2_PART_3_SIZE2, reference=chamfer2_part_3_side[0])

    # Chamfer2 part 4
    chamfer2_part_4_edges = [part_1.edges().sort_by_distance(p)[0] for p in [
        (7.12, 0, 0),
    ]]
    chamfer2_part_4_side = [part_1.faces().sort_by_distance(p)[0] for p in [
        (7.62, 0, 0),
    ]]
    chamfer(chamfer2_part_4_edges, length=CHAMFER2_PART_4_SIZE, length2=CHAMFER2_PART_4_SIZE2, reference=chamfer2_part_4_side[0])

    # Chamfer2 part 5
    chamfer2_part_5_edges = [part_1.edges().sort_by_distance(p)[0] for p in [
        (9.66, 0, 0),
    ]]
    chamfer2_part_5_side = [part_1.faces().sort_by_distance(p)[0] for p in [
        (10.16, 0, 0),
    ]]
    chamfer(chamfer2_part_5_edges, length=CHAMFER2_PART_5_SIZE, length2=CHAMFER2_PART_5_SIZE2, reference=chamfer2_part_5_side[0])

    # Chamfer2 part 6
    chamfer2_part_6_edges = [part_1.edges().sort_by_distance(p)[0] for p in [
        (12.2, 0, 0),
    ]]
    chamfer2_part_6_side = [part_1.faces().sort_by_distance(p)[0] for p in [
        (12.7, 0, 0),
    ]]
    chamfer(chamfer2_part_6_edges, length=CHAMFER2_PART_6_SIZE, length2=CHAMFER2_PART_6_SIZE2, reference=chamfer2_part_6_side[0])

    # Chamfer2 part 7
    chamfer2_part_7_edges = [part_1.edges().sort_by_distance(p)[0] for p in [
        (14.74, 0, 0),
    ]]
    chamfer2_part_7_side = [part_1.faces().sort_by_distance(p)[0] for p in [
        (15.24, 0, 0),
    ]]
    chamfer(chamfer2_part_7_edges, length=CHAMFER2_PART_7_SIZE, length2=CHAMFER2_PART_7_SIZE2, reference=chamfer2_part_7_side[0])

    # Chamfer2 part 8
    chamfer2_part_8_edges = [part_1.edges().sort_by_distance(p)[0] for p in [
        (17.28, 0, 0),
    ]]
    chamfer2_part_8_side = [part_1.faces().sort_by_distance(p)[0] for p in [
        (17.78, 0, 0),
    ]]
    chamfer(chamfer2_part_8_edges, length=CHAMFER2_PART_8_SIZE, length2=CHAMFER2_PART_8_SIZE2, reference=chamfer2_part_8_side[0])

    # Chamfer2 part 9
    chamfer2_part_9_edges = [part_1.edges().sort_by_distance(p)[0] for p in [
        (19.82, 0, 0),
    ]]
    chamfer2_part_9_side = [part_1.faces().sort_by_distance(p)[0] for p in [
        (20.32, 0, 0),
    ]]
    chamfer(chamfer2_part_9_edges, length=CHAMFER2_PART_9_SIZE, length2=CHAMFER2_PART_9_SIZE2, reference=chamfer2_part_9_side[0])

    # Chamfer2 part 10
    chamfer2_part_10_edges = [part_1.edges().sort_by_distance(p)[0] for p in [
        (22.36, 0, 0),
    ]]
    chamfer2_part_10_side = [part_1.faces().sort_by_distance(p)[0] for p in [
        (22.86, 0, 0),
    ]]
    chamfer(chamfer2_part_10_edges, length=CHAMFER2_PART_10_SIZE, length2=CHAMFER2_PART_10_SIZE2, reference=chamfer2_part_10_side[0])

    # Chamfer2 part 11
    chamfer2_part_11_edges = [part_1.edges().sort_by_distance(p)[0] for p in [
        (24.9, 0, 0),
    ]]
    chamfer2_part_11_side = [part_1.faces().sort_by_distance(p)[0] for p in [
        (25.4, 0, 0),
    ]]
    chamfer(chamfer2_part_11_edges, length=CHAMFER2_PART_11_SIZE, length2=CHAMFER2_PART_11_SIZE2, reference=chamfer2_part_11_side[0])

    # Chamfer2 part 12
    chamfer2_part_12_edges = [part_1.edges().sort_by_distance(p)[0] for p in [
        (27.44, 0, 0),
    ]]
    chamfer2_part_12_side = [part_1.faces().sort_by_distance(p)[0] for p in [
        (27.94, 0, 0),
    ]]
    chamfer(chamfer2_part_12_edges, length=CHAMFER2_PART_12_SIZE, length2=CHAMFER2_PART_12_SIZE2, reference=chamfer2_part_12_side[0])

    # Chamfer2 part 13
    chamfer2_part_13_edges = [part_1.edges().sort_by_distance(p)[0] for p in [
        (29.98, 0, 0),
    ]]
    chamfer2_part_13_side = [part_1.faces().sort_by_distance(p)[0] for p in [
        (30.48, 0, 0),
    ]]
    chamfer(chamfer2_part_13_edges, length=CHAMFER2_PART_13_SIZE, length2=CHAMFER2_PART_13_SIZE2, reference=chamfer2_part_13_side[0])

    # Chamfer2 part 14
    chamfer2_part_14_edges = [part_1.edges().sort_by_distance(p)[0] for p in [
        (32.52, 0, 0),
    ]]
    chamfer2_part_14_side = [part_1.faces().sort_by_distance(p)[0] for p in [
        (33.02, 0, 0),
    ]]
    chamfer(chamfer2_part_14_edges, length=CHAMFER2_PART_14_SIZE, length2=CHAMFER2_PART_14_SIZE2, reference=chamfer2_part_14_side[0])

    # Chamfer2 part 15
    chamfer2_part_15_edges = [part_1.edges().sort_by_distance(p)[0] for p in [
        (35.06, 0, 0),
    ]]
    chamfer2_part_15_side = [part_1.faces().sort_by_distance(p)[0] for p in [
        (35.56, 0, 0),
    ]]
    chamfer(chamfer2_part_15_edges, length=CHAMFER2_PART_15_SIZE, length2=CHAMFER2_PART_15_SIZE2, reference=chamfer2_part_15_side[0])

    # Chamfer2 part 16
    chamfer2_part_16_edges = [part_1.edges().sort_by_distance(p)[0] for p in [
        (37.6, 0, 0),
    ]]
    chamfer2_part_16_side = [part_1.faces().sort_by_distance(p)[0] for p in [
        (38.1, 0, 0),
    ]]
    chamfer(chamfer2_part_16_edges, length=CHAMFER2_PART_16_SIZE, length2=CHAMFER2_PART_16_SIZE2, reference=chamfer2_part_16_side[0])

    # Fillet2
    fillet2_edges = [part_1.edges().sort_by_distance(p)[0] for p in [
        (9.66, 0.5, 0),
        (17.28, 0.5, 0),
        (22.36, 0.5, 0),
        (27.44, 0.5, 0),
        (29.98, 0.5, 0),
        (-0.5, 0.5, 0),
        (2.04, 0.5, 0),
        (4.58, 0.5, 0),
        (7.12, 0.5, 0),
        (12.2, 0.5, 0),
        (14.74, 0.5, 0),
        (19.82, 0.5, 0),
        (24.9, 0.5, 0),
        (32.52, 0.5, 0),
        (35.06, 0.5, 0),
        (37.6, 0.5, 0),
    ]]
    fillet(fillet2_edges, radius=FILLET2_R)

    # Sketch3 → Cut-Extrude1 (cut, through all)
    with BuildSketch(Plane.XY.offset(1.27)):
        Polygon((29.21, 9), (29.21, 6.5), (29.21, -0.904576426), (41.732415353, -0.904576426), (41.732415353, 12.006276544), (29.21, 12.006276544), align=None)
    extrude(amount=-CUT_EXTRUDE1_DEPTH, mode=Mode.SUBTRACT)

    # Sketch4 → Cut-Extrude2 (cut, through all)
    with BuildSketch(Plane.XY.offset(1.27)):
        Polygon((16.51, 9), (16.51, 6.5), (16.51, -1.163081692), (30.596050739, -1.163081692), (30.596050739, 12.130577479), (16.51, 12.130577479), align=None)
    extrude(amount=-CUT_EXTRUDE2_DEPTH, mode=Mode.SUBTRACT)

    # Sketch5 → Cut-Extrude3 (cut, two sides)
    with BuildSketch(Plane.XY.offset(1.27)) as cut_extrude3_sk:
        with Locations((10.16, 5.75)):
            Rectangle(SKETCH5_W, SKETCH5_H)
    extrude(amount=CUT_EXTRUDE3_DEPTH, mode=Mode.SUBTRACT)
    extrude(cut_extrude3_sk.sketch, amount=-CUT_EXTRUDE3_DEPTH_BACK, mode=Mode.SUBTRACT)


solid = part_1.part
